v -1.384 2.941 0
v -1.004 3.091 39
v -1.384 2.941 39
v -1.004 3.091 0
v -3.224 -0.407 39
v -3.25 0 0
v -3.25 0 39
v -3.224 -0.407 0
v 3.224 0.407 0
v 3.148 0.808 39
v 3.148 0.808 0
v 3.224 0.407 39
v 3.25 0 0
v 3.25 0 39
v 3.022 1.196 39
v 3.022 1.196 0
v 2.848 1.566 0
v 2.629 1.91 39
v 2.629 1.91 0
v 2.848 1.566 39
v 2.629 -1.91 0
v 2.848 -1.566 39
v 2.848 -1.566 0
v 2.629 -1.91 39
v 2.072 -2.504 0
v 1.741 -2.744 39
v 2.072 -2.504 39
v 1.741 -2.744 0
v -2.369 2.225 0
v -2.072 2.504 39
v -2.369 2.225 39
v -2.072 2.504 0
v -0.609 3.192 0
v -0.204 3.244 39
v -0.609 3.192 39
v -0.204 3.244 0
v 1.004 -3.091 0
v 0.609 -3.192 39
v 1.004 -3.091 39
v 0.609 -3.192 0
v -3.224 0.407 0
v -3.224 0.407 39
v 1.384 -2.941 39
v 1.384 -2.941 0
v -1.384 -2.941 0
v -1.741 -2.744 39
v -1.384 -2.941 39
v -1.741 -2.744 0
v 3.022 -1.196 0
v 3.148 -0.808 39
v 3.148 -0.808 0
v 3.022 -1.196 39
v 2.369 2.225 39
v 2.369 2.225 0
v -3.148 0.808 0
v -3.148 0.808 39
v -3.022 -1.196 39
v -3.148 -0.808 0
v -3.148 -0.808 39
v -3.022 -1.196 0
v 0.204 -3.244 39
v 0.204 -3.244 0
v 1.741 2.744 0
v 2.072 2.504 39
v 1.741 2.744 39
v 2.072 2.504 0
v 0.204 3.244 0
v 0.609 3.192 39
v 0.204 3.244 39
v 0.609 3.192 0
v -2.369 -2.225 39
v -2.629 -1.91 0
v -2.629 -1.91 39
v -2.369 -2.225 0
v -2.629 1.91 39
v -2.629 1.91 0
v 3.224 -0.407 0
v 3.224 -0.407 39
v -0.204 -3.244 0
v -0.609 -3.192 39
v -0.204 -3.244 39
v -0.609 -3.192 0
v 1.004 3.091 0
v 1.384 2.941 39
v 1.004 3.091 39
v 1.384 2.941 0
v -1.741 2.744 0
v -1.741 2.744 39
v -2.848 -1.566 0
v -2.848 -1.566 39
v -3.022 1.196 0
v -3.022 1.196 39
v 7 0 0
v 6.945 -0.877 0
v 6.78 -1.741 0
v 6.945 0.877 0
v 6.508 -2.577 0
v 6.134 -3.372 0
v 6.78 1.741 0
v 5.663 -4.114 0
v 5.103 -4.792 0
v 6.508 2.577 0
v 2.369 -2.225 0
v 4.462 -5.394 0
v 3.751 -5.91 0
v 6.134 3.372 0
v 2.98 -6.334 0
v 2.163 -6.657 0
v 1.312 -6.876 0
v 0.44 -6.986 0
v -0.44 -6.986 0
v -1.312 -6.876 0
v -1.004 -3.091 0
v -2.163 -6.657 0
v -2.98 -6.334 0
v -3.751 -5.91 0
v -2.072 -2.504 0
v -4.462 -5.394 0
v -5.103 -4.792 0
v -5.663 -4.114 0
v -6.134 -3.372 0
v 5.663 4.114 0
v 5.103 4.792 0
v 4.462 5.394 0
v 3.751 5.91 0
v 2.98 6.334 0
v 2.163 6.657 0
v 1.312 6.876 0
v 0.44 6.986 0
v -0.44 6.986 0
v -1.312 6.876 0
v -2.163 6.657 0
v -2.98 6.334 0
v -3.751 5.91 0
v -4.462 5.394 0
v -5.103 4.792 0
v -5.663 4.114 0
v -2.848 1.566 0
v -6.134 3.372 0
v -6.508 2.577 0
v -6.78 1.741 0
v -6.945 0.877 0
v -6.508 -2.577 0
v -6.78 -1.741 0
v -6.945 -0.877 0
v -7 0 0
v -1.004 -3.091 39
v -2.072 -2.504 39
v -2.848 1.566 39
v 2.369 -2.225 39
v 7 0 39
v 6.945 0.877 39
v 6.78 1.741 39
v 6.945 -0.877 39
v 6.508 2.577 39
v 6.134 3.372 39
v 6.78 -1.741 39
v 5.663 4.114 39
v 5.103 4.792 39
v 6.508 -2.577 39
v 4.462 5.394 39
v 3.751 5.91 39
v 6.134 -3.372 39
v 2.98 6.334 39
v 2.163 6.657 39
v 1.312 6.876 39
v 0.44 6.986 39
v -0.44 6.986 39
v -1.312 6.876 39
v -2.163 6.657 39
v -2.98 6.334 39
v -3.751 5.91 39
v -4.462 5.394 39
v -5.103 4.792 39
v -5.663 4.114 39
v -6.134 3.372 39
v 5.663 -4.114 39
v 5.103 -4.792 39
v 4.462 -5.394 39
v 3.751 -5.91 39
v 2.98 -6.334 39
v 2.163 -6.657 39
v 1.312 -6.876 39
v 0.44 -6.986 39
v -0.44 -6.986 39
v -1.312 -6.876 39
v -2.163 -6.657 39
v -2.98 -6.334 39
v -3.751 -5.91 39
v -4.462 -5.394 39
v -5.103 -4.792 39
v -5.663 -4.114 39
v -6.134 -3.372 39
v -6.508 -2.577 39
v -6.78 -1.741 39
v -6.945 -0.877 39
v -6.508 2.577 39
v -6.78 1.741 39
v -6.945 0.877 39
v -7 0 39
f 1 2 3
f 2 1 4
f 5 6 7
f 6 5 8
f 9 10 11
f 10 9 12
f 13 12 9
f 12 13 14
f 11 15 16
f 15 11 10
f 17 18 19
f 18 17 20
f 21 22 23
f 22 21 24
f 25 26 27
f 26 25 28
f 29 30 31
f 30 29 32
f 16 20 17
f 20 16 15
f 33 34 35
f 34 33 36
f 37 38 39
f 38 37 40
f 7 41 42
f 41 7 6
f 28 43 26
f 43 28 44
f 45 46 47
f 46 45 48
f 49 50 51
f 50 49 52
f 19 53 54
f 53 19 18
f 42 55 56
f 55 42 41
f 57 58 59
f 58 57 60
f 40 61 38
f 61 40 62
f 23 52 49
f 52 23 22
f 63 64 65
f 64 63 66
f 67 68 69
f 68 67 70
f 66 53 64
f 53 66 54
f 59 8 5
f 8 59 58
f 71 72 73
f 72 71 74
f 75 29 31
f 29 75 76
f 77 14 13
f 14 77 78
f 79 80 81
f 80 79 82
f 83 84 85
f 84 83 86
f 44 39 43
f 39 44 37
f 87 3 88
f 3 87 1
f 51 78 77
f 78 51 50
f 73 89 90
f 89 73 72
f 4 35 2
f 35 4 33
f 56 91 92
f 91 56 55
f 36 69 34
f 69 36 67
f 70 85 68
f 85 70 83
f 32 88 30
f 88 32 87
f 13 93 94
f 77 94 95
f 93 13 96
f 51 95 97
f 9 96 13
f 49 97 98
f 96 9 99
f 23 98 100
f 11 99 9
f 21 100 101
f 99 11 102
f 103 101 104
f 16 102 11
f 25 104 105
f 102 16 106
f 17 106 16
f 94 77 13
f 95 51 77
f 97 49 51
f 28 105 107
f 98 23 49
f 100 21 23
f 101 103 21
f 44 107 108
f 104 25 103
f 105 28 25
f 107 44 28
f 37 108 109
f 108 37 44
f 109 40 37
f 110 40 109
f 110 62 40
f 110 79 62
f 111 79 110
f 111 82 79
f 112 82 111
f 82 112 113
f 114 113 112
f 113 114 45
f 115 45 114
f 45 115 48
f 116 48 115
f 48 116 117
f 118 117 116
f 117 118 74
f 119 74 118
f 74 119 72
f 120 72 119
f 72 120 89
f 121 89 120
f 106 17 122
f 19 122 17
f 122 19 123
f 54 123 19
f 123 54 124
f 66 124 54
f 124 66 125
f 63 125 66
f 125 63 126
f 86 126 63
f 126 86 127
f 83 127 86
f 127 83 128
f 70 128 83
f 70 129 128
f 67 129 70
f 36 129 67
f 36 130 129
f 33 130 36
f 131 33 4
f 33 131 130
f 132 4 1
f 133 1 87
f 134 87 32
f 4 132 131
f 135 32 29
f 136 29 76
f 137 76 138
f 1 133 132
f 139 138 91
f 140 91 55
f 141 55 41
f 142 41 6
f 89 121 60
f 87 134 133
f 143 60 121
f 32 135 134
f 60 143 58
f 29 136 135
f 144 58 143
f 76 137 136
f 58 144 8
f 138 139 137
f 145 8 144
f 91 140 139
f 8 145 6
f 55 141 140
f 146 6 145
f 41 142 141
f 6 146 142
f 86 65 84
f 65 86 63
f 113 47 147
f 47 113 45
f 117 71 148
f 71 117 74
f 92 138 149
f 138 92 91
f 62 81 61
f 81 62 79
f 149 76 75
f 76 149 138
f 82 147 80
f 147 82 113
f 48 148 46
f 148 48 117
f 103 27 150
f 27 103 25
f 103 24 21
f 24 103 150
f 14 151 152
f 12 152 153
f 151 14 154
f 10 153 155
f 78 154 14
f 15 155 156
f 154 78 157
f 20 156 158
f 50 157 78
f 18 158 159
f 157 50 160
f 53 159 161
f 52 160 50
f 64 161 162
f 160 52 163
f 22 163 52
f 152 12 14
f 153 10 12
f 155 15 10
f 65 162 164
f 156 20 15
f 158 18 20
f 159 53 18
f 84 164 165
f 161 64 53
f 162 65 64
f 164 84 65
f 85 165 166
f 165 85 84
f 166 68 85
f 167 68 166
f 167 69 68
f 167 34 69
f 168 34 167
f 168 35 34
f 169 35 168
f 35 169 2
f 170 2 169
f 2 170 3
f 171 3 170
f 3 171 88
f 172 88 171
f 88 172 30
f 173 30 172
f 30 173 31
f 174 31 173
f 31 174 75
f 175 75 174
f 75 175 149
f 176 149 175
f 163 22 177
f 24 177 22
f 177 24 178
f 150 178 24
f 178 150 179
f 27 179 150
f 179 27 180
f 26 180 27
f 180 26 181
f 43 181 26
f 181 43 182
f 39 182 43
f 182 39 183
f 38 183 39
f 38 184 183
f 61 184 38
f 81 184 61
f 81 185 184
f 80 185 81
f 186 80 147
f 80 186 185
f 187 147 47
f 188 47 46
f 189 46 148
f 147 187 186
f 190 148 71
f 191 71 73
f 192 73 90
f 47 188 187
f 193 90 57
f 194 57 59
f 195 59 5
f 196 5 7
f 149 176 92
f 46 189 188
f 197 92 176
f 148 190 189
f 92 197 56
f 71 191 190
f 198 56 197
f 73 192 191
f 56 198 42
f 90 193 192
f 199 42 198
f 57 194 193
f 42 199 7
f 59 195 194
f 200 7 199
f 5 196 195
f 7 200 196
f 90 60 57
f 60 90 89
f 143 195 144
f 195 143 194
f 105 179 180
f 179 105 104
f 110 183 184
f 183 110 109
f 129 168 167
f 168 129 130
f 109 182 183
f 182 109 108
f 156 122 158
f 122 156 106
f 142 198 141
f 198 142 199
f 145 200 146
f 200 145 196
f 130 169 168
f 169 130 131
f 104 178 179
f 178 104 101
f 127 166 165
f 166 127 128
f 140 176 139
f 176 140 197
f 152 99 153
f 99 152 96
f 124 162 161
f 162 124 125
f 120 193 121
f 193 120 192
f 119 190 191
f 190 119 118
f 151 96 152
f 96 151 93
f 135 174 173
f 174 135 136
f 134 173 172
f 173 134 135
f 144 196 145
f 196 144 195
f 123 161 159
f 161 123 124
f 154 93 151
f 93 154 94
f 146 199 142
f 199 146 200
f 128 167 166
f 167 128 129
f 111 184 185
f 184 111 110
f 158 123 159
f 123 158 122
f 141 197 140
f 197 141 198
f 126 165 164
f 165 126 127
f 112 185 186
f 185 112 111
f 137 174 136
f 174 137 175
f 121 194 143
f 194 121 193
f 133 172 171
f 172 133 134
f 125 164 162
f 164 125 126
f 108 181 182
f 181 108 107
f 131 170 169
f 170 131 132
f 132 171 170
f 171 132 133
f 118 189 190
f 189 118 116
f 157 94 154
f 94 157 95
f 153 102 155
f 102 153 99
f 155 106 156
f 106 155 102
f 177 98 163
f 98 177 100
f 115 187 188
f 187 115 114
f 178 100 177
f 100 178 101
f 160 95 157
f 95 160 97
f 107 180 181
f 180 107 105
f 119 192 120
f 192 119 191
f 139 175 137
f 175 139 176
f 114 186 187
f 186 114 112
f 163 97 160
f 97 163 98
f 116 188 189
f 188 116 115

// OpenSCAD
$fn = 50;


difference() {
	union() {
		cylinder(h = 39, r = 7.0000000000);
	}
	union() {
		cylinder(h = 39, r = 3.2500000000);
		cylinder(h = 39, r = 3.2500000000);
		cylinder(h = 39, r = 1.8000000000);
		cylinder(h = 39, r = 1.8000000000);
		cylinder(h = 39, r = 1.8000000000);
		cylinder(h = 39, r = 1.8000000000);
		cylinder(h = 39, r = 1.8000000000);
		cylinder(h = 39, r = 1.8000000000);
	}
}
